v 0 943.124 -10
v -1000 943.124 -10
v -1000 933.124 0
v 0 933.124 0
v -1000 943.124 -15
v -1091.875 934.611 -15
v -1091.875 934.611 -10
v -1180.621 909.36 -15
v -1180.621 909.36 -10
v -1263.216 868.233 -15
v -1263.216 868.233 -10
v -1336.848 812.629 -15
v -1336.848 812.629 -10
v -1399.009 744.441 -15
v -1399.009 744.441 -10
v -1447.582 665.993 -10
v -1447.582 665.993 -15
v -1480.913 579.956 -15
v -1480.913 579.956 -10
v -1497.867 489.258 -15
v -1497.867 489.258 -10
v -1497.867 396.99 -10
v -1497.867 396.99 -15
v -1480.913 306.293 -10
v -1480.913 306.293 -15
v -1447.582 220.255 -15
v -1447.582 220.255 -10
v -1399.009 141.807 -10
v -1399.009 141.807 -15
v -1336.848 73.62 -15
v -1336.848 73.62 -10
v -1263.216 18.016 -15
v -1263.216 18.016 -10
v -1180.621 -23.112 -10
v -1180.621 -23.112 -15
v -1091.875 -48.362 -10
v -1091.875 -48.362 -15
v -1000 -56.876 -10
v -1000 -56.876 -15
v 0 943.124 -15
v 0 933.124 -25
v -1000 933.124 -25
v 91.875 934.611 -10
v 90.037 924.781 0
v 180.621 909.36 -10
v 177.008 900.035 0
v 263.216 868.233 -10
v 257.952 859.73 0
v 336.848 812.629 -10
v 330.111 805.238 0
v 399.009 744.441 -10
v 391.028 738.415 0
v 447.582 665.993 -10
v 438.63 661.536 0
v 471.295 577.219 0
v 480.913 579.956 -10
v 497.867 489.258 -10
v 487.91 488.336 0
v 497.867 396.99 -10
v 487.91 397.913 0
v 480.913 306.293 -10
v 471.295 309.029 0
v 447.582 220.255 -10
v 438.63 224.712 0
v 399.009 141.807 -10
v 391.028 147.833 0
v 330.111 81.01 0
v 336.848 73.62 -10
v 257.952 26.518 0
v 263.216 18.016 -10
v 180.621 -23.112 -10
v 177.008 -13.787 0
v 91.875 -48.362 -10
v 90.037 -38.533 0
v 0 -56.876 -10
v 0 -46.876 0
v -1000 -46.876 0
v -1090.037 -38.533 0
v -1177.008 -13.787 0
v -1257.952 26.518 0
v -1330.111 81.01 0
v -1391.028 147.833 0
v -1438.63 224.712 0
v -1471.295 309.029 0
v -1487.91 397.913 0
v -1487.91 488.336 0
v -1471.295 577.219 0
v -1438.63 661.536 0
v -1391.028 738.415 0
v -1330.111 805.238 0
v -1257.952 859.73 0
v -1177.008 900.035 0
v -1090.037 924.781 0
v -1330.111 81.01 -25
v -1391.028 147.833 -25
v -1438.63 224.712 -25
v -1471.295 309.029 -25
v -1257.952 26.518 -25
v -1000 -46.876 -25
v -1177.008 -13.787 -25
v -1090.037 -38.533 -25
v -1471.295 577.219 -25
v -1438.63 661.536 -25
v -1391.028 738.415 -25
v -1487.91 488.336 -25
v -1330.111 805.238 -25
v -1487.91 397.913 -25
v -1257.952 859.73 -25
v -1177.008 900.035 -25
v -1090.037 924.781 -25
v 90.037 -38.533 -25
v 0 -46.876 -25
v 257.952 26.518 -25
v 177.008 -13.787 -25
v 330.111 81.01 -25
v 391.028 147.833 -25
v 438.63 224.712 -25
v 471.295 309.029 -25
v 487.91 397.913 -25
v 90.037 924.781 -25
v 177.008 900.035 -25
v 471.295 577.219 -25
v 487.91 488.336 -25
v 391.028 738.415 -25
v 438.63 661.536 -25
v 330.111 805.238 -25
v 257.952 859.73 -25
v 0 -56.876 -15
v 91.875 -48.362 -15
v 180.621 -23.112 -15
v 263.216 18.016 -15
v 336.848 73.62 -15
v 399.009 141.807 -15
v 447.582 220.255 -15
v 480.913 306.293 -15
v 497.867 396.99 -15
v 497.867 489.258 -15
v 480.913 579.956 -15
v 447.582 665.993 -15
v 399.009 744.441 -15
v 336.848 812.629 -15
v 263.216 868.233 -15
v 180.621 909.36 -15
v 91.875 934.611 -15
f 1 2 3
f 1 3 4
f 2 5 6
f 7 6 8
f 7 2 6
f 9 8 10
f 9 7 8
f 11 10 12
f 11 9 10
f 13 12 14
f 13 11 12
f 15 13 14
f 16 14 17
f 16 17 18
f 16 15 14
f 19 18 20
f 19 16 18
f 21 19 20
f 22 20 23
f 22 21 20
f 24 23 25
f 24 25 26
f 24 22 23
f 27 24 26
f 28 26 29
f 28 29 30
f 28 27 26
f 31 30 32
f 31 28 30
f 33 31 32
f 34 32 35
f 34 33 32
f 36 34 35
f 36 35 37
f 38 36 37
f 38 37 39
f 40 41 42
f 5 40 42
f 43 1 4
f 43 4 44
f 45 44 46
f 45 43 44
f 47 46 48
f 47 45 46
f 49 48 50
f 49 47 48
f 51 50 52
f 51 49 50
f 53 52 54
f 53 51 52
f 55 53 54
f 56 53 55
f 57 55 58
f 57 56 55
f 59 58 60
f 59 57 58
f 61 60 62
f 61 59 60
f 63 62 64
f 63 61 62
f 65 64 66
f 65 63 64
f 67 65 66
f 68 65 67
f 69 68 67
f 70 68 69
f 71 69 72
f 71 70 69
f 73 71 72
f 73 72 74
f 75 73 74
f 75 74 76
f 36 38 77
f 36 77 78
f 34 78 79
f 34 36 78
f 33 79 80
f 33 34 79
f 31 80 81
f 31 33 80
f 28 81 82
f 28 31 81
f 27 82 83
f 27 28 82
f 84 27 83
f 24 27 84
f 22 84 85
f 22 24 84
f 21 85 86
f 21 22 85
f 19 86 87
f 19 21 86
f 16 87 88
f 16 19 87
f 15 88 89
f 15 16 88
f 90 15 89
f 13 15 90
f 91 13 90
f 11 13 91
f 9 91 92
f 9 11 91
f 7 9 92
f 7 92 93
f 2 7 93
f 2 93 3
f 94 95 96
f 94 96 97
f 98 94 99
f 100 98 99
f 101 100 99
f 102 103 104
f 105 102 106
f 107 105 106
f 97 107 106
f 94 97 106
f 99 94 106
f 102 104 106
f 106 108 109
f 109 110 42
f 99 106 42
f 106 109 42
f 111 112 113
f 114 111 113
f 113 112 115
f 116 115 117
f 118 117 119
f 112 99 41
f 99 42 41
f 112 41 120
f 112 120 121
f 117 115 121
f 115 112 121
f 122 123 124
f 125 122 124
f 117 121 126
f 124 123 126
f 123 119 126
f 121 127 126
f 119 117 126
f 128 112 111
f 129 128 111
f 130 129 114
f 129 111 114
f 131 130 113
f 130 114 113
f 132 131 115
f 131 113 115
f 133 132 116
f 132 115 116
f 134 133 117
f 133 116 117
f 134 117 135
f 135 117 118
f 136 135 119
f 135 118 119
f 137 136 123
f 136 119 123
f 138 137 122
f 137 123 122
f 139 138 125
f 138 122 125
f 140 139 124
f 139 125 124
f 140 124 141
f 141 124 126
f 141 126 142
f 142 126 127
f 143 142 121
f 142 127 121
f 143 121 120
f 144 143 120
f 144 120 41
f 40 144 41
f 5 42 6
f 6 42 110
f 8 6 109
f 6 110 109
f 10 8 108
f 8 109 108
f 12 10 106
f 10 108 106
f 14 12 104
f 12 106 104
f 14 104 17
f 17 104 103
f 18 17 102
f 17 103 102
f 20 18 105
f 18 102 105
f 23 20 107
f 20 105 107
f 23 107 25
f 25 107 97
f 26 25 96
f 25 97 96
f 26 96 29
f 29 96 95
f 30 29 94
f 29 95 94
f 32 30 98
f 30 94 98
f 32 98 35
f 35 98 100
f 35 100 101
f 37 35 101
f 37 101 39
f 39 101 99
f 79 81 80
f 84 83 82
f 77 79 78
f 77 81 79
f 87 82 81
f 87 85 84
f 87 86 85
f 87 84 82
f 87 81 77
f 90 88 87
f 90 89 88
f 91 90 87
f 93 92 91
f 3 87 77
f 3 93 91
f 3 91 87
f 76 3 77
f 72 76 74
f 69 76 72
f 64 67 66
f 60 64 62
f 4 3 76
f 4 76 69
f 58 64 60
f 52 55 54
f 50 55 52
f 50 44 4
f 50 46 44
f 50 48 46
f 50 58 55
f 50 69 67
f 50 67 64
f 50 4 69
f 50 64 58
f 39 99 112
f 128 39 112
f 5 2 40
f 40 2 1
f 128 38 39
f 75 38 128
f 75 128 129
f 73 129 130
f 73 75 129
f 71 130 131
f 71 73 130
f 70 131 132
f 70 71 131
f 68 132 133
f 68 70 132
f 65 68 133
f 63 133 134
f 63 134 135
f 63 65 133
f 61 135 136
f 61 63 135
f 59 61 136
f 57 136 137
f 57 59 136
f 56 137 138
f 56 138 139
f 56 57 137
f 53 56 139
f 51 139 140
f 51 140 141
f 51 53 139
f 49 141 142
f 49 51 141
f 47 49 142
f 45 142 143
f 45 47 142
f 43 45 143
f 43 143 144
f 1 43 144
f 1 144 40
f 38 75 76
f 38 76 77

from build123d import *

# Parameters (mm, degrees)
F0_W     = 1000
F0_H     = 1000
F1_DEPTH = 25
F2_SIZE  = 10
F3_SIZE  = 10


with BuildPart() as f1:
    # F0 (on Top) → F1 (new body)
    with BuildSketch(Plane.XY):
        with BuildLine():
            Line((0, 943.124099), (0, -56.875901))
            ThreePointArc((0, -56.875901), (500, 443.124099), (0, 943.124099))
        make_face()
        with Locations((-500, 443.124099)):
            Rectangle(F0_W, F0_H)
        with BuildLine():
            ThreePointArc((-1000, 943.124099), (-1500, 443.124099), (-1000, -56.875901))
            Line((-1000, -56.875901), (-1000, 943.124099))
        make_face()
    extrude(amount=-F1_DEPTH)

    # F2
    f2_edges = [f1.edges().sort_by_distance(p)[0] for p in [
        (500, 443.124099, -25),
        (-500, 943.124099, -25),
        (-1500, 443.124099, -25),
        (-500, -56.875901, -25),
    ]]
    chamfer(f2_edges, length=F2_SIZE)

    # F3
    f3_edges = [f1.edges().sort_by_distance(p)[0] for p in [
        (-500, 943.124099, 0),
    ]]
    chamfer(f3_edges, length=F3_SIZE)


solid = f1.part
